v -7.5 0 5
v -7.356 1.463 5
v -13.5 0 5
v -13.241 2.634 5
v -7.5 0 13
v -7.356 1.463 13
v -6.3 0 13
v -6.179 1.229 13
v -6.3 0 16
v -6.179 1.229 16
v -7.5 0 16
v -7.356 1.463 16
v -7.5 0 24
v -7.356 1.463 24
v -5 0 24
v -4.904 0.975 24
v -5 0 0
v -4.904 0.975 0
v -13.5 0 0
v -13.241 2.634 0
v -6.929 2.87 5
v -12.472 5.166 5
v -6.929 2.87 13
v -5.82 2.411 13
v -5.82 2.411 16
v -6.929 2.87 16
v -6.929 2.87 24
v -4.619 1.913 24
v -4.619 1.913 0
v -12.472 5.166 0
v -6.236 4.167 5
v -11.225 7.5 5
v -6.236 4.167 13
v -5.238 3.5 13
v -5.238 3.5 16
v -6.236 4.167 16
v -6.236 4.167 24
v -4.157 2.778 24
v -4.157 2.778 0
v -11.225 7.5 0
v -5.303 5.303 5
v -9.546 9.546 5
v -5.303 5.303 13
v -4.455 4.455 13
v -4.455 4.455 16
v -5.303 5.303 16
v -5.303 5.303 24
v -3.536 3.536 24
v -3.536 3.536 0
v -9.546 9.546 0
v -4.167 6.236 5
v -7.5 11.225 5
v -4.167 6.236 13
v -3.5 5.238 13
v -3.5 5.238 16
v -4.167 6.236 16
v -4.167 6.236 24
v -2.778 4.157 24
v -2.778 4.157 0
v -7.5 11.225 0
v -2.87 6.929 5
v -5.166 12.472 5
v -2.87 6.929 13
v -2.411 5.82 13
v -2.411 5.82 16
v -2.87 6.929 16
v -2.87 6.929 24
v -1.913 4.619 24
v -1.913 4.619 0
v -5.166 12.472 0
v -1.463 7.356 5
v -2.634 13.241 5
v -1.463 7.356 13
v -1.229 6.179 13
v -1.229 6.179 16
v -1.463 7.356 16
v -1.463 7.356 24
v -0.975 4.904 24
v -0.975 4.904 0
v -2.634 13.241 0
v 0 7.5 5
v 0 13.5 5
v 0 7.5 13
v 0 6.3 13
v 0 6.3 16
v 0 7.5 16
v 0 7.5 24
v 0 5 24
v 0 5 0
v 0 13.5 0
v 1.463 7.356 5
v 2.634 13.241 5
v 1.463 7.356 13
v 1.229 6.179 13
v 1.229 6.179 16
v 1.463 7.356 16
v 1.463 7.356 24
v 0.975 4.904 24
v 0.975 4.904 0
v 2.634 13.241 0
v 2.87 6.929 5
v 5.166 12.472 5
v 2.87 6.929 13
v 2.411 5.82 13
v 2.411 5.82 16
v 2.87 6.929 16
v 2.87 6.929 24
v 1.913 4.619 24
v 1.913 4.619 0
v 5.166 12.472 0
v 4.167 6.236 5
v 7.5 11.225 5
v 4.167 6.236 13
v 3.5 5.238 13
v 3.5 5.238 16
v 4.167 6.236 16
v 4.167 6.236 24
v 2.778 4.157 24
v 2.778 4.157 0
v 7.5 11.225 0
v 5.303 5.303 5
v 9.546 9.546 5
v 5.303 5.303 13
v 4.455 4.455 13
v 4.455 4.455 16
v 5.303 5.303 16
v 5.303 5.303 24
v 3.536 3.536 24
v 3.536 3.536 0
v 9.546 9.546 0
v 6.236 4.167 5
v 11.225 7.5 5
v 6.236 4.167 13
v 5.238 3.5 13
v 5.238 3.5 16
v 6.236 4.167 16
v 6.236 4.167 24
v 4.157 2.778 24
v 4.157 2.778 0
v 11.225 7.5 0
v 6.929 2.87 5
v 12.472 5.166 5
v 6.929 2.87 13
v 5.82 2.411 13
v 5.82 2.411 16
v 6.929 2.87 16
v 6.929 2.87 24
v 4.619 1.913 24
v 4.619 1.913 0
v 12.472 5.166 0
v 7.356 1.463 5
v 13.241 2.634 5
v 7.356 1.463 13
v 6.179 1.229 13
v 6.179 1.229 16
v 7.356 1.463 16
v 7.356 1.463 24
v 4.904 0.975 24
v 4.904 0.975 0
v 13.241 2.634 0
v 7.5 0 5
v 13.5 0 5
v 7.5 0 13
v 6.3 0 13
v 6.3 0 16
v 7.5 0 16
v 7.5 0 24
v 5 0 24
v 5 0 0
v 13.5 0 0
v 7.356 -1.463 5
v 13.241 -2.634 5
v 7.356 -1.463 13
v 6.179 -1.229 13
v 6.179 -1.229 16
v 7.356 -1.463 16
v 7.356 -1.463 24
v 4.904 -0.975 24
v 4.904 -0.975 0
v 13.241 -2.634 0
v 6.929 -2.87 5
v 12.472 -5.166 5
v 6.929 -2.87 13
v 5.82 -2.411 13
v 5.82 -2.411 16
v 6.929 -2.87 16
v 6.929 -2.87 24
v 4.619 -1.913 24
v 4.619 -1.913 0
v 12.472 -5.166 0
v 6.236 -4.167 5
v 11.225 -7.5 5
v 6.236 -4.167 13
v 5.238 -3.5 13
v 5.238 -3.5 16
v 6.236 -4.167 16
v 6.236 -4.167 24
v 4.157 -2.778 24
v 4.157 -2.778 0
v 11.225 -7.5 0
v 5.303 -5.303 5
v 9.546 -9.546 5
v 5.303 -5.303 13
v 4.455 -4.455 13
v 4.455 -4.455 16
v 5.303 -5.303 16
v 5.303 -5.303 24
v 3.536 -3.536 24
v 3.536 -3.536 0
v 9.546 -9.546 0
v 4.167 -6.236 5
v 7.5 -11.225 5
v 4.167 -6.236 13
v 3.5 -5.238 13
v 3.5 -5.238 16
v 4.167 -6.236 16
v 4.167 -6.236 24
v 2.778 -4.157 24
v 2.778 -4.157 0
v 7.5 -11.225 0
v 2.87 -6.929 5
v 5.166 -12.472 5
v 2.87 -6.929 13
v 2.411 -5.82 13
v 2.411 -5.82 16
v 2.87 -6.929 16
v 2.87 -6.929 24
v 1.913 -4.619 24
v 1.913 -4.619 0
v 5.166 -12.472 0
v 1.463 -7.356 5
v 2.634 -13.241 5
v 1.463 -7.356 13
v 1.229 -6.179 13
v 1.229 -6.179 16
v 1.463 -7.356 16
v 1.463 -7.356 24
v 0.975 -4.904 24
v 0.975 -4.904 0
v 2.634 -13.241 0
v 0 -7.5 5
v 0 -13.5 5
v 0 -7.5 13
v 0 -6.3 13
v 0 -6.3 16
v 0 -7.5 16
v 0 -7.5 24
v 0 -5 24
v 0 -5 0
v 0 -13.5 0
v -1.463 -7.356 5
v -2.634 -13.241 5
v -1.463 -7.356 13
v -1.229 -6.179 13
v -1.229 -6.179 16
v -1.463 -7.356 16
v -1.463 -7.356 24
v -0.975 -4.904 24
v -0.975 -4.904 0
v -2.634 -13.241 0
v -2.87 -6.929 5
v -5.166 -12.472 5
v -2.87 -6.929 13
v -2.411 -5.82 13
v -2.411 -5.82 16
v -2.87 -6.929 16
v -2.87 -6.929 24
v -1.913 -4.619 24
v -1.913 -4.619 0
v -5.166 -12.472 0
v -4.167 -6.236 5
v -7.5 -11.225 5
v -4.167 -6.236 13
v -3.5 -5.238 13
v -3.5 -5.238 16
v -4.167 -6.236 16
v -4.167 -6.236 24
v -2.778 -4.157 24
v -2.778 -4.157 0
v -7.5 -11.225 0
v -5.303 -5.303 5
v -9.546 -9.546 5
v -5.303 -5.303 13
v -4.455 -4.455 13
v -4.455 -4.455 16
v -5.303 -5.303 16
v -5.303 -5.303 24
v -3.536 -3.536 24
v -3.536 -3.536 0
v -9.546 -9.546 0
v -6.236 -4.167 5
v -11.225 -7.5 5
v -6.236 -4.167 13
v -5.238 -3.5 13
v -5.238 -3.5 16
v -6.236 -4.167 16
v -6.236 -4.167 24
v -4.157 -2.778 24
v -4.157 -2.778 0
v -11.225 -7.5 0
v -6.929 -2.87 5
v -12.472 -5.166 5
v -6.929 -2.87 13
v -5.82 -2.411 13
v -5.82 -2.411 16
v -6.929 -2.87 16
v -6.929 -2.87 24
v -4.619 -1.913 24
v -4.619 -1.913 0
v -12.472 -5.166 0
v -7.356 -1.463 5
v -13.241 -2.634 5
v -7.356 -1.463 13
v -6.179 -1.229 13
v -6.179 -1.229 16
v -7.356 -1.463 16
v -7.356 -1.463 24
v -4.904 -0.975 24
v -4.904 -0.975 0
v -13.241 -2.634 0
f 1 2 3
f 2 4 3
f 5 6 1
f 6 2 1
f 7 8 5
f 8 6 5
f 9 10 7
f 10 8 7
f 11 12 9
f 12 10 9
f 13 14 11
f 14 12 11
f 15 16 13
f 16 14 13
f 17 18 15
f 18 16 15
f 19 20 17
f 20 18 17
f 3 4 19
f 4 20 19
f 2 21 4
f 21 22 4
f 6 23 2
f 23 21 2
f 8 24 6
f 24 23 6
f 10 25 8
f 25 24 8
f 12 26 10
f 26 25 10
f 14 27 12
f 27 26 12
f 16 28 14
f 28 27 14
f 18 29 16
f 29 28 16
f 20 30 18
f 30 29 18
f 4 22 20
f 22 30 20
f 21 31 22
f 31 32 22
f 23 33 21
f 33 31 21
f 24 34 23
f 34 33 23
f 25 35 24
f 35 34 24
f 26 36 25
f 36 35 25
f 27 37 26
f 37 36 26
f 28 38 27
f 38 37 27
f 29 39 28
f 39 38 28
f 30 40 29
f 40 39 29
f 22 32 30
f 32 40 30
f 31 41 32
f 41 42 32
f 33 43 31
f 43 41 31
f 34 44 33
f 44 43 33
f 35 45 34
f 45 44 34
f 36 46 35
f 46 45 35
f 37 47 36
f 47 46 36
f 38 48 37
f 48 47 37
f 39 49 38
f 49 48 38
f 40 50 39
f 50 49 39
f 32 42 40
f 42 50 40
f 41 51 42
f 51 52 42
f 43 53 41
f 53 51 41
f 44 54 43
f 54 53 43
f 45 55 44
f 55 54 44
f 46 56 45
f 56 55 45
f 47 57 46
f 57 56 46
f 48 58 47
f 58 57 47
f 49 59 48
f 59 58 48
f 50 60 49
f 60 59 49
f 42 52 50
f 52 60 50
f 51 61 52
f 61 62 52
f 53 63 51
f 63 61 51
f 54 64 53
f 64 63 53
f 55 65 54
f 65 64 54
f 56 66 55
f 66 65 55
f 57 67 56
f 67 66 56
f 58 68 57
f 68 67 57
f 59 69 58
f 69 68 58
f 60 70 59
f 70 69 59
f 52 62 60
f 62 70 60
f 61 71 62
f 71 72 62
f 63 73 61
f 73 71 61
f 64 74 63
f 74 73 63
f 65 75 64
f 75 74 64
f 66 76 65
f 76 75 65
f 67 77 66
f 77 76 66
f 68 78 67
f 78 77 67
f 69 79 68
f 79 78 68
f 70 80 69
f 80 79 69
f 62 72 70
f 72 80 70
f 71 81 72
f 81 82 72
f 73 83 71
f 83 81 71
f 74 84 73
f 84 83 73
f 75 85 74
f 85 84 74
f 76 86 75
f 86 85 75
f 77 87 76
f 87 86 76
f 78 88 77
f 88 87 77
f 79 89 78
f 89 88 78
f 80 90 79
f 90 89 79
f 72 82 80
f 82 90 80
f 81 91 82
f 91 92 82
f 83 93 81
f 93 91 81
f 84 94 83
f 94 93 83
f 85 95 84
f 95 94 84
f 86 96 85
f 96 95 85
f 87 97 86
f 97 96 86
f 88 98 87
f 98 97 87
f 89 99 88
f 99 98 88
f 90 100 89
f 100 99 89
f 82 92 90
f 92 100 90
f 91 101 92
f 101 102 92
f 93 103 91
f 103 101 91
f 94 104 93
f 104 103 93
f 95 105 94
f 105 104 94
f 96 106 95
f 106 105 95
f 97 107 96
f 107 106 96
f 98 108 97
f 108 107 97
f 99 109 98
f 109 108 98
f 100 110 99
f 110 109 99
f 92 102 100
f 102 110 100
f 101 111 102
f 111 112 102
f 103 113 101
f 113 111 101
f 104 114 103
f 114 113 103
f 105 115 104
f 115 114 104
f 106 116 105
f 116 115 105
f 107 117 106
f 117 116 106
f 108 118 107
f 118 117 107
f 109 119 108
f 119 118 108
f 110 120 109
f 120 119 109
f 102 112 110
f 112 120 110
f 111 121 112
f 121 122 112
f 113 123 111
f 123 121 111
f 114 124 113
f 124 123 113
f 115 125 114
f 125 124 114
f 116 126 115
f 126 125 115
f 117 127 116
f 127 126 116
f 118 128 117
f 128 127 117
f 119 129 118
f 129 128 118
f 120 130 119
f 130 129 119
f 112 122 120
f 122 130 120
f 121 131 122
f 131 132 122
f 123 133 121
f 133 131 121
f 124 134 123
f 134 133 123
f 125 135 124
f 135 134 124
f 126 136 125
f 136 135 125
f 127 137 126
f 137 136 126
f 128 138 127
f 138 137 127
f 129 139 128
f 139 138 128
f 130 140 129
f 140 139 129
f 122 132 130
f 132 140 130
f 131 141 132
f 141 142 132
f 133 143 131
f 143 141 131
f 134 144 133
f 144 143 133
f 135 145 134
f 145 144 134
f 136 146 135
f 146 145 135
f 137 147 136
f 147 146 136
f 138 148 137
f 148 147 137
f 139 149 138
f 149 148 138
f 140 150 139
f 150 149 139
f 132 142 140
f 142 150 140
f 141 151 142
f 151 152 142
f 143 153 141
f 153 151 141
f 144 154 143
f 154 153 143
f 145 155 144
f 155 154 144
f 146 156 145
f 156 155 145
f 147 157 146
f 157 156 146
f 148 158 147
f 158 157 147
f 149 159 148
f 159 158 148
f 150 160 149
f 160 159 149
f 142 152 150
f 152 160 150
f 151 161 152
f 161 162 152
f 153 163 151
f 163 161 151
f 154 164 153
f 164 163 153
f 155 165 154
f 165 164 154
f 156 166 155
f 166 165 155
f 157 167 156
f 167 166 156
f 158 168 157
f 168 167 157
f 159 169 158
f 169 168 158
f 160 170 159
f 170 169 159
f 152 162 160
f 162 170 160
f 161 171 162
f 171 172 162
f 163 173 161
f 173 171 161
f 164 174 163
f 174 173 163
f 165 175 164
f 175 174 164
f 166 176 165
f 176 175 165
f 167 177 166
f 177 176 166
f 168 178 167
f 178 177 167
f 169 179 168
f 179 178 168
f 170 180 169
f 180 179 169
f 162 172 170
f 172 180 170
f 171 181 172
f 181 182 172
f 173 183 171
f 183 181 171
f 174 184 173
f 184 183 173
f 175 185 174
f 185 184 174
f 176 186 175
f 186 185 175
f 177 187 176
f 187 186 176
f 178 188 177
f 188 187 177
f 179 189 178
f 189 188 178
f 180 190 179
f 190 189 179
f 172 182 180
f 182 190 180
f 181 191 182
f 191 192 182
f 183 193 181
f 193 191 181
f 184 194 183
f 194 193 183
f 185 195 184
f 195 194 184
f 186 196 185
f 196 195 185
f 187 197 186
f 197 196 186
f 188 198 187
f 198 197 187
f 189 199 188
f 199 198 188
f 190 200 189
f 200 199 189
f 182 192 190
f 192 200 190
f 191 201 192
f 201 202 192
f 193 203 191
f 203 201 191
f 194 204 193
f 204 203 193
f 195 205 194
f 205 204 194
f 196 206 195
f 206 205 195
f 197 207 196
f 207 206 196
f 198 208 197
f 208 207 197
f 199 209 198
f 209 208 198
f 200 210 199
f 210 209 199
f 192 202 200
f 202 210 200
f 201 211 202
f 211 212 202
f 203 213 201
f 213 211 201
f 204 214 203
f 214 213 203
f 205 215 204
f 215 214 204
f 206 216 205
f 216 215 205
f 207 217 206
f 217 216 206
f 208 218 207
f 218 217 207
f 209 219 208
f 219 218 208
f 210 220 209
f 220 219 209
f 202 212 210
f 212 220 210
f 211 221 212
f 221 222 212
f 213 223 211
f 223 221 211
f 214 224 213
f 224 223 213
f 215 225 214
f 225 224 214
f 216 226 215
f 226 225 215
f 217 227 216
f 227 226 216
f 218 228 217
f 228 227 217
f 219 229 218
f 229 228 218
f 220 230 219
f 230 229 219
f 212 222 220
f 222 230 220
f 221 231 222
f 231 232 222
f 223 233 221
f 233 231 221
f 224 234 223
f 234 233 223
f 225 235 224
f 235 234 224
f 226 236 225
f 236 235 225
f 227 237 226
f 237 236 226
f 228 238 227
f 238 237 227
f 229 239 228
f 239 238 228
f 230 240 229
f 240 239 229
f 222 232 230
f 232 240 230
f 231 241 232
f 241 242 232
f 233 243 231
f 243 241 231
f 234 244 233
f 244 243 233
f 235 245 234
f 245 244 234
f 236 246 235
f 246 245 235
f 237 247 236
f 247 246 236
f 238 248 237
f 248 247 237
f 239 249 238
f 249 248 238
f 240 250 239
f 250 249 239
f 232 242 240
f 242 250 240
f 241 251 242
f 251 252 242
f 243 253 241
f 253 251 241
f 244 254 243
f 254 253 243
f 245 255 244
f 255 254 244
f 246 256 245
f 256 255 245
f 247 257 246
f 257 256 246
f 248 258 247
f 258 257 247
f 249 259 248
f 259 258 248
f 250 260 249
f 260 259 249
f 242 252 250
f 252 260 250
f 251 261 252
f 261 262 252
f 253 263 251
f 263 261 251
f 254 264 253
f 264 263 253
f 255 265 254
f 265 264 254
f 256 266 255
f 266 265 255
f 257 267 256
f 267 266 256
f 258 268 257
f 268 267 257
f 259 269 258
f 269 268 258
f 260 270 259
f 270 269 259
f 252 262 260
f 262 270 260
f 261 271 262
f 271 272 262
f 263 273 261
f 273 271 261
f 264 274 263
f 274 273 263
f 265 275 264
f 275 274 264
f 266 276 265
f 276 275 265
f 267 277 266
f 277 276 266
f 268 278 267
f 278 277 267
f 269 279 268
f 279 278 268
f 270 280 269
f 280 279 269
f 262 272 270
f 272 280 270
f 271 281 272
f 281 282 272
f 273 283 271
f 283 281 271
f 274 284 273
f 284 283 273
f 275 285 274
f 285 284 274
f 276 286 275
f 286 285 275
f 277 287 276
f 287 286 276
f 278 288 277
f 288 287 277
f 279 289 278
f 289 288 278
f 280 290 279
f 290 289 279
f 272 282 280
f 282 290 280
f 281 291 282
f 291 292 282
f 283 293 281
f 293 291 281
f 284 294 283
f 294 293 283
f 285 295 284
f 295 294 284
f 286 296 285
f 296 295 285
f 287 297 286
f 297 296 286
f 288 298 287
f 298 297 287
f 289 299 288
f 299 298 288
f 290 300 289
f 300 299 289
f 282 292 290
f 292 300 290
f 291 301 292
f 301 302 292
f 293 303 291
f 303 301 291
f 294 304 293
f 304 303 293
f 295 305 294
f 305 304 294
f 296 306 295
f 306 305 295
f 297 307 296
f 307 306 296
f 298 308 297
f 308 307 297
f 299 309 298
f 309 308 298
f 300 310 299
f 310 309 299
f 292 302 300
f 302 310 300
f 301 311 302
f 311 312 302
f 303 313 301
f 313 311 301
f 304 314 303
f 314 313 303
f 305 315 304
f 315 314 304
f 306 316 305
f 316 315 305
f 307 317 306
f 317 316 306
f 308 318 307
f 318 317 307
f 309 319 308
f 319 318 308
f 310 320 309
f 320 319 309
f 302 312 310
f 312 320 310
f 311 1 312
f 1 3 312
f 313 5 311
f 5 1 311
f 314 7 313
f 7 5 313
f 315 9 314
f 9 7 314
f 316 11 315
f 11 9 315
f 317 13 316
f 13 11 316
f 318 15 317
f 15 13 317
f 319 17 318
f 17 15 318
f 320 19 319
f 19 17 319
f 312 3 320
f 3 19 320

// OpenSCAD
$fn = 32;

// ----------------------------------------------------------------------
// Grooved revolve: flanged, bore R5
// ----------------------------------------------------------------------

// --- parameters (mm) ---
bore_r = 5;               // bore radius
outer_r = 7.5;            // outer radius of the body
total_h = 24;             // overall height, Z
wall = 2.5;               // radial wall thickness
groove_w = 3;             // groove width
groove_d = 1.2;           // groove depth
grooves = 1;              // number of outer grooves
flange_r = 13.5;          // flange radius
flange_h = 5;             // flange height

bbox_x = 2 * flange_r;  // full diameter
bore_d = 2 * bore_r;  // bore diameter
body_d = 2 * outer_r;  // body diameter
flange_d = 2 * flange_r;  // flange diameter
revolve_angle = 360;  // full turn around the Z axis

profile = [[5, 0], [7.5, 0], [13.5, 0], [13.5, 5], [7.5, 5], [7.5, 13], [6.3, 13], [6.3, 16], [7.5, 16], [7.5, 24], [5, 24]];  // primary outline, 11 points, counter clockwise

// --- the one profile operation ---
rotate_extrude(angle = revolve_angle) polygon(points = profile);
